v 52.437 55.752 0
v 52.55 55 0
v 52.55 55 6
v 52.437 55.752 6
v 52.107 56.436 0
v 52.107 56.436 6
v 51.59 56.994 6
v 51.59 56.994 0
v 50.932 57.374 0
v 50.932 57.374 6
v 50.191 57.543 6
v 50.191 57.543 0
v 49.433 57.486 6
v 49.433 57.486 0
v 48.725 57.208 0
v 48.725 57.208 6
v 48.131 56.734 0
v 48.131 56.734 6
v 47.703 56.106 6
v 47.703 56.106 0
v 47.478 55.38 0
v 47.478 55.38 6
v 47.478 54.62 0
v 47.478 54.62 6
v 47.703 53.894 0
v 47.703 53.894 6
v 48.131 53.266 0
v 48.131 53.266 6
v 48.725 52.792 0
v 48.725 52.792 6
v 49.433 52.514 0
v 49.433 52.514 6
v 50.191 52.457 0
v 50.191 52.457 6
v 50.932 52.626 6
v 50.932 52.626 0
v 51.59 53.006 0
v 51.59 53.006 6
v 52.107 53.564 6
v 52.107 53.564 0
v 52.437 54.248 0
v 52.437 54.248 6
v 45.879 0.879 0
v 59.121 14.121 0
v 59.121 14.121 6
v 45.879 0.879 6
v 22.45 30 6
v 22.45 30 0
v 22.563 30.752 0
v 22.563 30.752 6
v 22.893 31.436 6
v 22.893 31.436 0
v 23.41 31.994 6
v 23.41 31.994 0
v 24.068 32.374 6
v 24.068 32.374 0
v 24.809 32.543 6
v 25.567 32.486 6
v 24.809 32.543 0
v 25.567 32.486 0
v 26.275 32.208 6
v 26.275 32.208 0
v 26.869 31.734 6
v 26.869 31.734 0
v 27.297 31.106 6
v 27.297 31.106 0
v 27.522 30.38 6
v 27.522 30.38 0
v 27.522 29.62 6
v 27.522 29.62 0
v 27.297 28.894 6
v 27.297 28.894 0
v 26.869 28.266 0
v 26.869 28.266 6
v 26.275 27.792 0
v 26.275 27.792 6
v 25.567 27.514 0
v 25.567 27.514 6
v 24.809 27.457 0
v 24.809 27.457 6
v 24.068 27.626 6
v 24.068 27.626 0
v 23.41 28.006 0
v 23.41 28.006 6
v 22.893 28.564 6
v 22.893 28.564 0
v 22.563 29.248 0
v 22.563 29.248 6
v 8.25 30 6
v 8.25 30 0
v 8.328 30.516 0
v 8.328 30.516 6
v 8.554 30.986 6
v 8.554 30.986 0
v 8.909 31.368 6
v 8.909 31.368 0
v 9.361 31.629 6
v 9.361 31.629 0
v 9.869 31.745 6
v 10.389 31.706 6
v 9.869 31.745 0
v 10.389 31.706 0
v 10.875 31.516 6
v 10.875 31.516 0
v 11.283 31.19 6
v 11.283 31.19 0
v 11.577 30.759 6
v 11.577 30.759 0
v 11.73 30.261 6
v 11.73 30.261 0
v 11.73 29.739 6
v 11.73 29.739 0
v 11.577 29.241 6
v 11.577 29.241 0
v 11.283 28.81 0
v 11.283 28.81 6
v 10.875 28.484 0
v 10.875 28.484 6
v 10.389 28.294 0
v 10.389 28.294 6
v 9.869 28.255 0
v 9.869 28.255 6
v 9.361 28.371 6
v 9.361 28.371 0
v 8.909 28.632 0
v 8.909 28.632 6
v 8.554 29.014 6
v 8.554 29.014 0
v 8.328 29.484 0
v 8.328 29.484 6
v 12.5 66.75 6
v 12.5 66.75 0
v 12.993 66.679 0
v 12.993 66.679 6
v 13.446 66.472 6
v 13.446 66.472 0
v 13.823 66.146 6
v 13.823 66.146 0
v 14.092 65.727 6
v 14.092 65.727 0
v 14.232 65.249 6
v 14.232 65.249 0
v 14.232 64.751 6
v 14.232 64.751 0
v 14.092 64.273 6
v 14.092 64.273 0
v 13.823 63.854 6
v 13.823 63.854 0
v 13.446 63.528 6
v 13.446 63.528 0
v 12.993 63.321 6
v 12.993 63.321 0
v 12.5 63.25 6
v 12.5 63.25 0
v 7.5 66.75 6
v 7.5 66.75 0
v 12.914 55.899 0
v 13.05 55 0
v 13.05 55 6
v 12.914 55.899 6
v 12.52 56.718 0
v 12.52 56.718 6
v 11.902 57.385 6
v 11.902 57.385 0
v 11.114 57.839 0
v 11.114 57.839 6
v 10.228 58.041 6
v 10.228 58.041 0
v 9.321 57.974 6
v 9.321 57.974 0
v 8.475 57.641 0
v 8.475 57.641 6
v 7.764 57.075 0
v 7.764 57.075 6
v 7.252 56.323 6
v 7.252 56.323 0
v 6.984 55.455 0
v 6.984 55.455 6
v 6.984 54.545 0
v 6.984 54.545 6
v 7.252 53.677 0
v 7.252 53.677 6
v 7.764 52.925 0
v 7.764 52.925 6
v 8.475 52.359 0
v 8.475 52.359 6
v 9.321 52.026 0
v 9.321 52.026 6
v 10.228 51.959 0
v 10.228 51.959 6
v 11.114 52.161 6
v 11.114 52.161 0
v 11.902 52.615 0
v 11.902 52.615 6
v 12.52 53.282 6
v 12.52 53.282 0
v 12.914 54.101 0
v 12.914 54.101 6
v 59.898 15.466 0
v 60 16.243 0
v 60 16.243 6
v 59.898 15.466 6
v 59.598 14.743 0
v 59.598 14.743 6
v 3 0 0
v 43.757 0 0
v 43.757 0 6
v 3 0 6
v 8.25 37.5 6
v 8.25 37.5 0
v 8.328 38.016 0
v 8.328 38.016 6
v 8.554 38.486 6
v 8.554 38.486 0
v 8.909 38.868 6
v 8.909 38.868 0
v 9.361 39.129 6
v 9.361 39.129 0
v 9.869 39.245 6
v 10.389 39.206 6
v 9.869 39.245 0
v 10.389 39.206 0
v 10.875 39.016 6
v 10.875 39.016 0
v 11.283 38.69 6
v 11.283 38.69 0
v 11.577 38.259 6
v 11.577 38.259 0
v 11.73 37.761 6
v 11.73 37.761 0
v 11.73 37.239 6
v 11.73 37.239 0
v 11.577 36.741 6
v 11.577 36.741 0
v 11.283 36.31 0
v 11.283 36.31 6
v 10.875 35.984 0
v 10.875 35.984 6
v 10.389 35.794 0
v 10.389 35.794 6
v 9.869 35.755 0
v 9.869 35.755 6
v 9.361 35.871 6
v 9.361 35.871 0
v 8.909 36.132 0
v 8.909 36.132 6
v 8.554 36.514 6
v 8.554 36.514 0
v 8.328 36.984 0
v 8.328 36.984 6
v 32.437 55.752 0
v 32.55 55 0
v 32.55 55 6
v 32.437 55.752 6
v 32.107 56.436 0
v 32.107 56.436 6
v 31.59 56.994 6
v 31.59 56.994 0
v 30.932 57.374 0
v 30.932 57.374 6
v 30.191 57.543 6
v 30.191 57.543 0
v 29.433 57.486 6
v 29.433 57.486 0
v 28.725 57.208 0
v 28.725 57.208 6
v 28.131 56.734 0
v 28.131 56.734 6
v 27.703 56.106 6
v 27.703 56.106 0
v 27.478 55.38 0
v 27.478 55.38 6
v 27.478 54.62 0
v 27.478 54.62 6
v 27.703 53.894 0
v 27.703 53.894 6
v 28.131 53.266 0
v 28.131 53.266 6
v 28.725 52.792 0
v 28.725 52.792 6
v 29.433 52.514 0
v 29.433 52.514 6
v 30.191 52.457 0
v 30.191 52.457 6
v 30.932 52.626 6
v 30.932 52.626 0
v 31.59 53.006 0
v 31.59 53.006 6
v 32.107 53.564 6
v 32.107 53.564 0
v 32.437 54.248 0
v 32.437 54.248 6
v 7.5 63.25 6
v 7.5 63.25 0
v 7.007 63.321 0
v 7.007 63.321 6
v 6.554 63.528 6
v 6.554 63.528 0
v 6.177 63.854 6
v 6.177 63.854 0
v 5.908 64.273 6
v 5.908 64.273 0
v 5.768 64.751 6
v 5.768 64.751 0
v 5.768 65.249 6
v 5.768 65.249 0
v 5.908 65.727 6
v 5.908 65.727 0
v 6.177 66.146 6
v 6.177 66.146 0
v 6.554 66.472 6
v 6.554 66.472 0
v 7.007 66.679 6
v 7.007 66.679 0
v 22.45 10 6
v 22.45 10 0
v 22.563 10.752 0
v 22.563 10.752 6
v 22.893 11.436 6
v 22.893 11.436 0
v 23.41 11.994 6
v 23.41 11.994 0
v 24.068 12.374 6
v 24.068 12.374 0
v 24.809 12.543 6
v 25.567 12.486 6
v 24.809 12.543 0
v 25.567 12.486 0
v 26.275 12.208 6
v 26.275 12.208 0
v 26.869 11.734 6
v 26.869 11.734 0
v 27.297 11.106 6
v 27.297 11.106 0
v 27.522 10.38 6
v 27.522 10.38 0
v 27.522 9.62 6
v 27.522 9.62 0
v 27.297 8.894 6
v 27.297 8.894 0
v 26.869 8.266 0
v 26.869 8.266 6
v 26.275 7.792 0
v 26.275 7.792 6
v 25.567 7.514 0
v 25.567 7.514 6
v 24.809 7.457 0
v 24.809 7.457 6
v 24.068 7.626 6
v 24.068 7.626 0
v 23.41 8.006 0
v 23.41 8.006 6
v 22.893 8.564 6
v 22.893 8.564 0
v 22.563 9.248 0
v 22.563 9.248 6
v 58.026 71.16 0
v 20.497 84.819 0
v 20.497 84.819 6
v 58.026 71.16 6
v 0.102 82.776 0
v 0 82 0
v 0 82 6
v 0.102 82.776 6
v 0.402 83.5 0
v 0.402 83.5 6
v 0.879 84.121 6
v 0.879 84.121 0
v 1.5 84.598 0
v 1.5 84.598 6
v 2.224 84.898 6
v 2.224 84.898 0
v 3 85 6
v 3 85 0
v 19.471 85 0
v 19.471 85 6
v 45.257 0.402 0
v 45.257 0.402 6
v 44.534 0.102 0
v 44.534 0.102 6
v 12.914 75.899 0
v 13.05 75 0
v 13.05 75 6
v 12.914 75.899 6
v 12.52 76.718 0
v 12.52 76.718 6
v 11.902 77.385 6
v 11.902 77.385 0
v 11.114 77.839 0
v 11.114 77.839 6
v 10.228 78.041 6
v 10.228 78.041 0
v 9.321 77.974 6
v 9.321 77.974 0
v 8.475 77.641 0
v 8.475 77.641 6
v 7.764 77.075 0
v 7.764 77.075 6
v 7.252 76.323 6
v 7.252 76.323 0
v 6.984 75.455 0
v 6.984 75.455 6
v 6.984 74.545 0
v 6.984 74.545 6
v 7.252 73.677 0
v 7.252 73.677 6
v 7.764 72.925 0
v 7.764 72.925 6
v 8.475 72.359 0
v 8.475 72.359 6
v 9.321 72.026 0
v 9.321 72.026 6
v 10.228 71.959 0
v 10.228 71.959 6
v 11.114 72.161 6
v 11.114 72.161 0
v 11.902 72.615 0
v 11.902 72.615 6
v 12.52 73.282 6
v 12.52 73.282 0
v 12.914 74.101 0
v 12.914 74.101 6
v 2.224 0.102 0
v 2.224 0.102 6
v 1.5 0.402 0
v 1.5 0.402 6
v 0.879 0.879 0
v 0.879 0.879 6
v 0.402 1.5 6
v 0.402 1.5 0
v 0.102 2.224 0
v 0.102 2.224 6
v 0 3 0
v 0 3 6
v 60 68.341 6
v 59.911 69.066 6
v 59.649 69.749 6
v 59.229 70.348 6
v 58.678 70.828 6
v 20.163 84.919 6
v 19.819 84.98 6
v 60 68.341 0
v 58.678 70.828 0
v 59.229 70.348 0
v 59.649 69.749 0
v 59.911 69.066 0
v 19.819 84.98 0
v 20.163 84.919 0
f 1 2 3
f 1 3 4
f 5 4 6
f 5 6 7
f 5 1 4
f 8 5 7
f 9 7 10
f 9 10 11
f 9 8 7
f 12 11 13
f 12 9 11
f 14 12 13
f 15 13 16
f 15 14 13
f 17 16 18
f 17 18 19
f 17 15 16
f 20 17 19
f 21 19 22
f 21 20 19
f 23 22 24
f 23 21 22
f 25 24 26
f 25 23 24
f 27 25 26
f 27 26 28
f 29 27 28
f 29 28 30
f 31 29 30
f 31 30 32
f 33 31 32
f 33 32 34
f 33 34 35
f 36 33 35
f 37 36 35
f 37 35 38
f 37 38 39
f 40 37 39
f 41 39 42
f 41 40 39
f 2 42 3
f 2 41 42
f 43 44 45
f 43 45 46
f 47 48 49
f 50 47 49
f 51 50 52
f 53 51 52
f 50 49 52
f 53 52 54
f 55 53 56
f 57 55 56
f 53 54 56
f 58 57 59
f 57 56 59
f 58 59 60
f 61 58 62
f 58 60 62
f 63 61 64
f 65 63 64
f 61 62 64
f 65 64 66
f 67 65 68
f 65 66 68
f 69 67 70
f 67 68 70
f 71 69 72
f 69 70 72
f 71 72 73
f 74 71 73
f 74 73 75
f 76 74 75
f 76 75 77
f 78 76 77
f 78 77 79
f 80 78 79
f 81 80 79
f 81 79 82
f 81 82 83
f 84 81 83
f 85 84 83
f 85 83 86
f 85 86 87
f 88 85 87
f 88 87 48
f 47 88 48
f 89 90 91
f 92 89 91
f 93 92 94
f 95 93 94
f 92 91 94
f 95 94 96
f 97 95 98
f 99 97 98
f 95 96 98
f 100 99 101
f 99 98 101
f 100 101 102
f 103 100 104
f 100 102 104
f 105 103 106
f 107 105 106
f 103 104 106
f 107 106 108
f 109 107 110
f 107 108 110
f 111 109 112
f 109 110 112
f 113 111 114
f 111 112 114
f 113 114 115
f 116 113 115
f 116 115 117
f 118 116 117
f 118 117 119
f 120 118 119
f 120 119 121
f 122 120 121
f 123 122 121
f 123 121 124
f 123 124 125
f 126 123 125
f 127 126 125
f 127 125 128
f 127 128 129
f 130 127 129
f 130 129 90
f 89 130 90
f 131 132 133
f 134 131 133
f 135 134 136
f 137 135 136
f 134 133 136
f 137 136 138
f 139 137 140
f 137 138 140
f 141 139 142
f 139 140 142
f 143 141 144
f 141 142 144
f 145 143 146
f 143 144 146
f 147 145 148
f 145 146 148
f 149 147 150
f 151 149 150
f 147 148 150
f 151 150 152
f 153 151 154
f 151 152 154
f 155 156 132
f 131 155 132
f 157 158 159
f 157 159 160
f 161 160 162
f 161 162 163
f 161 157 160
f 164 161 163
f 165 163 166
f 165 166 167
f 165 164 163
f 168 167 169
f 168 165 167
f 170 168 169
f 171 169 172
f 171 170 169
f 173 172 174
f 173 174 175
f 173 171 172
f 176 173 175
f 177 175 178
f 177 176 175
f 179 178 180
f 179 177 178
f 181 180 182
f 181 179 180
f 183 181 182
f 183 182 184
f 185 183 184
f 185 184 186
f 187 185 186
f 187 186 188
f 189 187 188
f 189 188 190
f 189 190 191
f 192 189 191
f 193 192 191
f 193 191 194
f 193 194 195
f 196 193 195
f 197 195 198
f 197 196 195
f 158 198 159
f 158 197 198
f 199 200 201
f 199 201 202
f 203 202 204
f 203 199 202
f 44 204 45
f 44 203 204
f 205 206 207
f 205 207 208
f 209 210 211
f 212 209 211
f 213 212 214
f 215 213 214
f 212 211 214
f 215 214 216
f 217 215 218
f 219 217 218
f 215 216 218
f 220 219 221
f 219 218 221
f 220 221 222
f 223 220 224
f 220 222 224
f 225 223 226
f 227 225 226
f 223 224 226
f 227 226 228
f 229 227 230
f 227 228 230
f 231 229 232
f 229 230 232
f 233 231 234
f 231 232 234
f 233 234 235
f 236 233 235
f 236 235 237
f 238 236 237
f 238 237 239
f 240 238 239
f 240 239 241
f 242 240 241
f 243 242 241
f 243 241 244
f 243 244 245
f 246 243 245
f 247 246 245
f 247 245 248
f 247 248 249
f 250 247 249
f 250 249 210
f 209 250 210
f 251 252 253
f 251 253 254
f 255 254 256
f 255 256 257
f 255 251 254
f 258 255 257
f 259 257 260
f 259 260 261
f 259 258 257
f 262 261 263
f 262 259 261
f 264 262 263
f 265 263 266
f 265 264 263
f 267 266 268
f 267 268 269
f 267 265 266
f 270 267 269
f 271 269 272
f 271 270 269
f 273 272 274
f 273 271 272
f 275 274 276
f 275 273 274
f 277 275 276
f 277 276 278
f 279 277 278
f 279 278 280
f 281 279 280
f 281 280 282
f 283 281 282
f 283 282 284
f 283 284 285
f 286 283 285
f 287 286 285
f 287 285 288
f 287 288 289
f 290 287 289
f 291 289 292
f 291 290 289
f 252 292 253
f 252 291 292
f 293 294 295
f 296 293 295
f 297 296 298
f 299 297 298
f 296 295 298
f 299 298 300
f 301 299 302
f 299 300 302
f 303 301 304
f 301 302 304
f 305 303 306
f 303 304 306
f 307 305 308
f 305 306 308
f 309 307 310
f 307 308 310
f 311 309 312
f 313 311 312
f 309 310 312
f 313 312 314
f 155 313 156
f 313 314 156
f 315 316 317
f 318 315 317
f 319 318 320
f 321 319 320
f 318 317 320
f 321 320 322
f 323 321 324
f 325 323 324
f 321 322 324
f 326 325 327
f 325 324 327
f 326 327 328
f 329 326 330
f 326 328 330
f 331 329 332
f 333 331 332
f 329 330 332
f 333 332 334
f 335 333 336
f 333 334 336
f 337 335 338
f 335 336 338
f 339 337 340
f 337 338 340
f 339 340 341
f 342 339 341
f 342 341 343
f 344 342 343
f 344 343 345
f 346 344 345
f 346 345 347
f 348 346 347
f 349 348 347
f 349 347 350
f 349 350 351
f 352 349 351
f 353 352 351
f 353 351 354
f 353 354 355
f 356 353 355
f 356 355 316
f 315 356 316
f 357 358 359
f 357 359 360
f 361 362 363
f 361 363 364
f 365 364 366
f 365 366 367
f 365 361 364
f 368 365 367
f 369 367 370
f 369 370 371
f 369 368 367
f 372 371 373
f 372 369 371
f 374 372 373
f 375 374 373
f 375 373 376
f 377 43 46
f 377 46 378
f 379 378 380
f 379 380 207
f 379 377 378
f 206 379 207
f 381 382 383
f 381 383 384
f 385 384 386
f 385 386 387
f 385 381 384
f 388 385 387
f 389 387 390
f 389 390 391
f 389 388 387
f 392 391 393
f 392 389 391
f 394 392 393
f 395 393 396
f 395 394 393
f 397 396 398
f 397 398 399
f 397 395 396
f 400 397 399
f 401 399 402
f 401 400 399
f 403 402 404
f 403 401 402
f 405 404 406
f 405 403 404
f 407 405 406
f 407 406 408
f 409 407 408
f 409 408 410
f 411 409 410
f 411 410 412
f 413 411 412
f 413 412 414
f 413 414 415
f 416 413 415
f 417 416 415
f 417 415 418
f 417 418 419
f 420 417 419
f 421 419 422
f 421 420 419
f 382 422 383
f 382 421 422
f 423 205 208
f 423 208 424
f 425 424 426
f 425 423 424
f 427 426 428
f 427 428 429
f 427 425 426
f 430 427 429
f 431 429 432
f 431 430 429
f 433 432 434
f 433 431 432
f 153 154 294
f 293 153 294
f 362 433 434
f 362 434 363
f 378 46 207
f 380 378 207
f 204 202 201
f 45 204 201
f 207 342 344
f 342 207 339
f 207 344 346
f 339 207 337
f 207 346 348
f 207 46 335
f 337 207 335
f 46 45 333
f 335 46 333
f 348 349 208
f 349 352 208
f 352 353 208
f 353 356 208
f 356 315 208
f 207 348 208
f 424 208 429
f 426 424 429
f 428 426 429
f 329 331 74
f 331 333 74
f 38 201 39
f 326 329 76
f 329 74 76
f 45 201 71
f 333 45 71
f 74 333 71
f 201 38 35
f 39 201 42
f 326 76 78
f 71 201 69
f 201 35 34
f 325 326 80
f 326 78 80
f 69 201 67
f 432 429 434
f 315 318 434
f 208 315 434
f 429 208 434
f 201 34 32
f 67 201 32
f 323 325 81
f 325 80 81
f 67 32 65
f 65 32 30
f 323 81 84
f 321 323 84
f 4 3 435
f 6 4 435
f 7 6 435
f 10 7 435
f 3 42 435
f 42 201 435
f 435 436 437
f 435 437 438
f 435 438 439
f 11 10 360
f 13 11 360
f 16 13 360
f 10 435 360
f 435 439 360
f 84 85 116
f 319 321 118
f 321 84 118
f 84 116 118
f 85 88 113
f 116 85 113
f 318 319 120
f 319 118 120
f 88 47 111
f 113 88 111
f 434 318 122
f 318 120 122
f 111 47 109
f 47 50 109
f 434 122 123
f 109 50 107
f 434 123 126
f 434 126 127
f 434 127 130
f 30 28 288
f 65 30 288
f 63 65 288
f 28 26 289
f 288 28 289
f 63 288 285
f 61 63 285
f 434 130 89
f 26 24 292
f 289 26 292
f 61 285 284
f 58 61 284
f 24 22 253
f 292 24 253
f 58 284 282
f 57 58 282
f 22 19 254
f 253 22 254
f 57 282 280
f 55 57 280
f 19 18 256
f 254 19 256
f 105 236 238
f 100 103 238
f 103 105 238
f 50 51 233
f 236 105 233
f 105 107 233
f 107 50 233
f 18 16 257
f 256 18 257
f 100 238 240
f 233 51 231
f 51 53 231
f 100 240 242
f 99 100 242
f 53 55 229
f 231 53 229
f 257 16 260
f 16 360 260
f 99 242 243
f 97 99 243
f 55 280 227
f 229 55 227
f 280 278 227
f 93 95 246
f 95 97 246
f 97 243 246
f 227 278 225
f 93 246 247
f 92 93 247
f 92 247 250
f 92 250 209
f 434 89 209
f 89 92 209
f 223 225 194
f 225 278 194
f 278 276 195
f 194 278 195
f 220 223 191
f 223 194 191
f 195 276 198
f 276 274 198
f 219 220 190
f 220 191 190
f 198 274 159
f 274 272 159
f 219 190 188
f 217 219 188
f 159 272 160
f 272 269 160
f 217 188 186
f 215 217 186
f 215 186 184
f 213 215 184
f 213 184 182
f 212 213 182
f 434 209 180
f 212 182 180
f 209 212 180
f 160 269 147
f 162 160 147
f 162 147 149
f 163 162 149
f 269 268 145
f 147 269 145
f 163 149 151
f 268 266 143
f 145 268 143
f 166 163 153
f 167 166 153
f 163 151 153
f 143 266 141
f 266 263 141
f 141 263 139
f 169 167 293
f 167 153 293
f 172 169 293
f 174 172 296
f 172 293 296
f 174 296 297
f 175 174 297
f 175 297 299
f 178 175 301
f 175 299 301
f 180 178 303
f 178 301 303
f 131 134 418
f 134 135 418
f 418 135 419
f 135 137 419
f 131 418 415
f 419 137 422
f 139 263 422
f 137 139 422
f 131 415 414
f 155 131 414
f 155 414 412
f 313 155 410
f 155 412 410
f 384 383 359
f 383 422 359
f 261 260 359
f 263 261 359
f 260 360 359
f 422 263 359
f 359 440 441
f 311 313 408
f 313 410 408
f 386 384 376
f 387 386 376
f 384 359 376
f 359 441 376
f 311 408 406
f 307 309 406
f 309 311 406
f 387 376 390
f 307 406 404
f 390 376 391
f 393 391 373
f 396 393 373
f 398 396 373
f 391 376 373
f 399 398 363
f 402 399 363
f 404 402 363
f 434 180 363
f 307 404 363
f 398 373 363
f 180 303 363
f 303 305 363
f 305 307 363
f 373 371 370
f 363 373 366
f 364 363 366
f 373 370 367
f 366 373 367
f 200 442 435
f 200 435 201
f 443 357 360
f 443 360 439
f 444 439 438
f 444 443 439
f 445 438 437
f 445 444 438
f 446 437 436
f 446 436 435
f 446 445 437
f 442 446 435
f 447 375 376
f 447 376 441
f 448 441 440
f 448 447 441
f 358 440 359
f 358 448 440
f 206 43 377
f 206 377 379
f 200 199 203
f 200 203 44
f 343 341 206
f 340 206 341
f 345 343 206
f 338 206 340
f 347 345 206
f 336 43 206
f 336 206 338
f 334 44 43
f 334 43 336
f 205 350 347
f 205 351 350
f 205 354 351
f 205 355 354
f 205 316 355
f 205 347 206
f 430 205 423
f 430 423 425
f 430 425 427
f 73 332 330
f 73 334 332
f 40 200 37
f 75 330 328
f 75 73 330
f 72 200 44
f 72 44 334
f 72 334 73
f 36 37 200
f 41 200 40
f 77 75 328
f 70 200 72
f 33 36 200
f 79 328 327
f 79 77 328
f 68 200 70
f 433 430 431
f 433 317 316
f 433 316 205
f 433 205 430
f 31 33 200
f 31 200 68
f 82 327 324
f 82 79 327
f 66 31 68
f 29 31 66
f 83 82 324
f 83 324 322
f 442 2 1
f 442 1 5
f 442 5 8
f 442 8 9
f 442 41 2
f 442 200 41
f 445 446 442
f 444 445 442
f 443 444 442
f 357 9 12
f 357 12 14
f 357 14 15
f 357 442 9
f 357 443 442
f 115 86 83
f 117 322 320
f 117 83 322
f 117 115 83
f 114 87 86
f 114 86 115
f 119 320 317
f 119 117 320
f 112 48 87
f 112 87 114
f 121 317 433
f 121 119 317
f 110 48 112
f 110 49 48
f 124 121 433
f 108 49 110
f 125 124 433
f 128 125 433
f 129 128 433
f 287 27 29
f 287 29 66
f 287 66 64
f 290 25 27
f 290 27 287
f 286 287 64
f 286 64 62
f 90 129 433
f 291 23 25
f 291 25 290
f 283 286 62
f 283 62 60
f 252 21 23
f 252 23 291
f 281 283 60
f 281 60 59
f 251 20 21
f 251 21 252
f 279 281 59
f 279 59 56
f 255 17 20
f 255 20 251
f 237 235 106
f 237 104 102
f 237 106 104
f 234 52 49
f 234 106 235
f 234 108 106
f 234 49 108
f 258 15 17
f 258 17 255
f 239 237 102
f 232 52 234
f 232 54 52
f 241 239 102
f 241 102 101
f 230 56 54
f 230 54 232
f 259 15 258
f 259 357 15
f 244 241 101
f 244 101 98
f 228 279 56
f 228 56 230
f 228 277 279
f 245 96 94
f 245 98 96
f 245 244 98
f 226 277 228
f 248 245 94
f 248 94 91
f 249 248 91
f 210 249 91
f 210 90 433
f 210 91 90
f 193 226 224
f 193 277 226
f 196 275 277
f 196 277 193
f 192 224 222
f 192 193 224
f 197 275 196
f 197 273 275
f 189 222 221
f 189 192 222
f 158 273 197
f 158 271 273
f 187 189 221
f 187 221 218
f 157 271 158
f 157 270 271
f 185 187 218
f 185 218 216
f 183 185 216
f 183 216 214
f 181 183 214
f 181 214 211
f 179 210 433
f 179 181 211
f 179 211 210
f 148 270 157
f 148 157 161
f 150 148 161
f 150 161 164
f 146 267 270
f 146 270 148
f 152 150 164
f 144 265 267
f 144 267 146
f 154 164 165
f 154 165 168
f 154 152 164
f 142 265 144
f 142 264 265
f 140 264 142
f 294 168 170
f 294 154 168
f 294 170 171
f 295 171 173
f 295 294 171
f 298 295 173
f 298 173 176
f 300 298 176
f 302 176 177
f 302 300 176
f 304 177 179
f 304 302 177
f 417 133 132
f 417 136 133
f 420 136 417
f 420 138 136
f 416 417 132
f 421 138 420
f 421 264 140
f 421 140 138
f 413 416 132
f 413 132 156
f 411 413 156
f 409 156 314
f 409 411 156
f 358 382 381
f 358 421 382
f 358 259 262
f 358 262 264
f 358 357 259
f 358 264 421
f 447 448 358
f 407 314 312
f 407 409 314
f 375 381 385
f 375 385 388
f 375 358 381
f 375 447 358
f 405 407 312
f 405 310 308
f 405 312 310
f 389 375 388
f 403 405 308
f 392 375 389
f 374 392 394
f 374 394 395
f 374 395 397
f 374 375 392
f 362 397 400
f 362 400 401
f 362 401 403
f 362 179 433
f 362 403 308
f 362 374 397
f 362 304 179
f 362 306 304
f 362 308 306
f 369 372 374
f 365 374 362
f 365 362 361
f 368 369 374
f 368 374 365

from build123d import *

# Parameters (mm, degrees)
MODEL_R                  = 3.05
MODEL_R_2                = 2.55
BODY_DEPTH               = 6
SKETCH1_R                = 1.75
FORSENSOR_DEPTH          = 10
F_5_1_5_1_FOOTINGMOUNT_D = 5.1


with BuildPart() as part:
    # Model → Body (new body)
    with BuildSketch(Plane.XY):
        with BuildLine():
            Line((59.121320344, 14.121320344), (45.878679656, 0.878679656))
            ThreePointArc((45.878679656, 0.878679656), (44.90540961, 0.228361402), (43.757359313, 0))
            Line((43.757359313, 0), (3, 0))
            ThreePointArc((3, 0), (0.878679656, 0.878679656), (0, 3))
            Line((0, 3), (0, 82))
            ThreePointArc((0, 82), (0.878679656, 84.121320344), (3, 85))
            Line((3, 85), (19.471019058, 85))
            ThreePointArc((19.471019058, 85), (19.991963591, 84.954423259), (20.497079488, 84.819077862))
            Line((20.497079488, 84.819077862), (58.02606043, 71.159645877))
            ThreePointArc((58.02606043, 71.159645877), (59.457456133, 70.061297324), (60, 68.340568015))
            Line((60, 68.340568015), (60, 16.242640687))
            ThreePointArc((60, 16.242640687), (59.771638598, 15.09459039), (59.121320344, 14.121320344))
        make_face()
        with Locations((10, 75)):
            Circle(MODEL_R, mode=Mode.SUBTRACT)
        with Locations((10, 55)):
            Circle(MODEL_R, mode=Mode.SUBTRACT)
        with Locations((30, 55)):
            Circle(MODEL_R_2, mode=Mode.SUBTRACT)
        with Locations((50, 55)):
            Circle(MODEL_R_2, mode=Mode.SUBTRACT)
        with BuildLine():
            Line((12.5, 63.25), (7.5, 63.25))
            ThreePointArc((7.5, 63.25), (5.75, 65), (7.5, 66.75))
            Line((7.5, 66.75), (12.5, 66.75))
            ThreePointArc((12.5, 66.75), (14.25, 65), (12.5, 63.25))
        make_face(mode=Mode.SUBTRACT)
    extrude(amount=BODY_DEPTH)

    # Sketch1 → ForSensor (cut)
    with BuildSketch(Plane(origin=(0, 0, 0), x_dir=(-1, 0, 0), z_dir=(0, 0, -1))):
        with Locations((-10, 30)):
            Circle(SKETCH1_R)
        with Locations((-10, 37.5)):
            Circle(SKETCH1_R)
    extrude(amount=-FORSENSOR_DEPTH, mode=Mode.SUBTRACT)

    # Ø5.1 (5.1) FootingMount (through all)
    with Locations(Plane.XY.offset(6)):
        with Locations((25, 10), (25, 30)):
            Hole(F_5_1_5_1_FOOTINGMOUNT_D / 2)


solid = part.part
